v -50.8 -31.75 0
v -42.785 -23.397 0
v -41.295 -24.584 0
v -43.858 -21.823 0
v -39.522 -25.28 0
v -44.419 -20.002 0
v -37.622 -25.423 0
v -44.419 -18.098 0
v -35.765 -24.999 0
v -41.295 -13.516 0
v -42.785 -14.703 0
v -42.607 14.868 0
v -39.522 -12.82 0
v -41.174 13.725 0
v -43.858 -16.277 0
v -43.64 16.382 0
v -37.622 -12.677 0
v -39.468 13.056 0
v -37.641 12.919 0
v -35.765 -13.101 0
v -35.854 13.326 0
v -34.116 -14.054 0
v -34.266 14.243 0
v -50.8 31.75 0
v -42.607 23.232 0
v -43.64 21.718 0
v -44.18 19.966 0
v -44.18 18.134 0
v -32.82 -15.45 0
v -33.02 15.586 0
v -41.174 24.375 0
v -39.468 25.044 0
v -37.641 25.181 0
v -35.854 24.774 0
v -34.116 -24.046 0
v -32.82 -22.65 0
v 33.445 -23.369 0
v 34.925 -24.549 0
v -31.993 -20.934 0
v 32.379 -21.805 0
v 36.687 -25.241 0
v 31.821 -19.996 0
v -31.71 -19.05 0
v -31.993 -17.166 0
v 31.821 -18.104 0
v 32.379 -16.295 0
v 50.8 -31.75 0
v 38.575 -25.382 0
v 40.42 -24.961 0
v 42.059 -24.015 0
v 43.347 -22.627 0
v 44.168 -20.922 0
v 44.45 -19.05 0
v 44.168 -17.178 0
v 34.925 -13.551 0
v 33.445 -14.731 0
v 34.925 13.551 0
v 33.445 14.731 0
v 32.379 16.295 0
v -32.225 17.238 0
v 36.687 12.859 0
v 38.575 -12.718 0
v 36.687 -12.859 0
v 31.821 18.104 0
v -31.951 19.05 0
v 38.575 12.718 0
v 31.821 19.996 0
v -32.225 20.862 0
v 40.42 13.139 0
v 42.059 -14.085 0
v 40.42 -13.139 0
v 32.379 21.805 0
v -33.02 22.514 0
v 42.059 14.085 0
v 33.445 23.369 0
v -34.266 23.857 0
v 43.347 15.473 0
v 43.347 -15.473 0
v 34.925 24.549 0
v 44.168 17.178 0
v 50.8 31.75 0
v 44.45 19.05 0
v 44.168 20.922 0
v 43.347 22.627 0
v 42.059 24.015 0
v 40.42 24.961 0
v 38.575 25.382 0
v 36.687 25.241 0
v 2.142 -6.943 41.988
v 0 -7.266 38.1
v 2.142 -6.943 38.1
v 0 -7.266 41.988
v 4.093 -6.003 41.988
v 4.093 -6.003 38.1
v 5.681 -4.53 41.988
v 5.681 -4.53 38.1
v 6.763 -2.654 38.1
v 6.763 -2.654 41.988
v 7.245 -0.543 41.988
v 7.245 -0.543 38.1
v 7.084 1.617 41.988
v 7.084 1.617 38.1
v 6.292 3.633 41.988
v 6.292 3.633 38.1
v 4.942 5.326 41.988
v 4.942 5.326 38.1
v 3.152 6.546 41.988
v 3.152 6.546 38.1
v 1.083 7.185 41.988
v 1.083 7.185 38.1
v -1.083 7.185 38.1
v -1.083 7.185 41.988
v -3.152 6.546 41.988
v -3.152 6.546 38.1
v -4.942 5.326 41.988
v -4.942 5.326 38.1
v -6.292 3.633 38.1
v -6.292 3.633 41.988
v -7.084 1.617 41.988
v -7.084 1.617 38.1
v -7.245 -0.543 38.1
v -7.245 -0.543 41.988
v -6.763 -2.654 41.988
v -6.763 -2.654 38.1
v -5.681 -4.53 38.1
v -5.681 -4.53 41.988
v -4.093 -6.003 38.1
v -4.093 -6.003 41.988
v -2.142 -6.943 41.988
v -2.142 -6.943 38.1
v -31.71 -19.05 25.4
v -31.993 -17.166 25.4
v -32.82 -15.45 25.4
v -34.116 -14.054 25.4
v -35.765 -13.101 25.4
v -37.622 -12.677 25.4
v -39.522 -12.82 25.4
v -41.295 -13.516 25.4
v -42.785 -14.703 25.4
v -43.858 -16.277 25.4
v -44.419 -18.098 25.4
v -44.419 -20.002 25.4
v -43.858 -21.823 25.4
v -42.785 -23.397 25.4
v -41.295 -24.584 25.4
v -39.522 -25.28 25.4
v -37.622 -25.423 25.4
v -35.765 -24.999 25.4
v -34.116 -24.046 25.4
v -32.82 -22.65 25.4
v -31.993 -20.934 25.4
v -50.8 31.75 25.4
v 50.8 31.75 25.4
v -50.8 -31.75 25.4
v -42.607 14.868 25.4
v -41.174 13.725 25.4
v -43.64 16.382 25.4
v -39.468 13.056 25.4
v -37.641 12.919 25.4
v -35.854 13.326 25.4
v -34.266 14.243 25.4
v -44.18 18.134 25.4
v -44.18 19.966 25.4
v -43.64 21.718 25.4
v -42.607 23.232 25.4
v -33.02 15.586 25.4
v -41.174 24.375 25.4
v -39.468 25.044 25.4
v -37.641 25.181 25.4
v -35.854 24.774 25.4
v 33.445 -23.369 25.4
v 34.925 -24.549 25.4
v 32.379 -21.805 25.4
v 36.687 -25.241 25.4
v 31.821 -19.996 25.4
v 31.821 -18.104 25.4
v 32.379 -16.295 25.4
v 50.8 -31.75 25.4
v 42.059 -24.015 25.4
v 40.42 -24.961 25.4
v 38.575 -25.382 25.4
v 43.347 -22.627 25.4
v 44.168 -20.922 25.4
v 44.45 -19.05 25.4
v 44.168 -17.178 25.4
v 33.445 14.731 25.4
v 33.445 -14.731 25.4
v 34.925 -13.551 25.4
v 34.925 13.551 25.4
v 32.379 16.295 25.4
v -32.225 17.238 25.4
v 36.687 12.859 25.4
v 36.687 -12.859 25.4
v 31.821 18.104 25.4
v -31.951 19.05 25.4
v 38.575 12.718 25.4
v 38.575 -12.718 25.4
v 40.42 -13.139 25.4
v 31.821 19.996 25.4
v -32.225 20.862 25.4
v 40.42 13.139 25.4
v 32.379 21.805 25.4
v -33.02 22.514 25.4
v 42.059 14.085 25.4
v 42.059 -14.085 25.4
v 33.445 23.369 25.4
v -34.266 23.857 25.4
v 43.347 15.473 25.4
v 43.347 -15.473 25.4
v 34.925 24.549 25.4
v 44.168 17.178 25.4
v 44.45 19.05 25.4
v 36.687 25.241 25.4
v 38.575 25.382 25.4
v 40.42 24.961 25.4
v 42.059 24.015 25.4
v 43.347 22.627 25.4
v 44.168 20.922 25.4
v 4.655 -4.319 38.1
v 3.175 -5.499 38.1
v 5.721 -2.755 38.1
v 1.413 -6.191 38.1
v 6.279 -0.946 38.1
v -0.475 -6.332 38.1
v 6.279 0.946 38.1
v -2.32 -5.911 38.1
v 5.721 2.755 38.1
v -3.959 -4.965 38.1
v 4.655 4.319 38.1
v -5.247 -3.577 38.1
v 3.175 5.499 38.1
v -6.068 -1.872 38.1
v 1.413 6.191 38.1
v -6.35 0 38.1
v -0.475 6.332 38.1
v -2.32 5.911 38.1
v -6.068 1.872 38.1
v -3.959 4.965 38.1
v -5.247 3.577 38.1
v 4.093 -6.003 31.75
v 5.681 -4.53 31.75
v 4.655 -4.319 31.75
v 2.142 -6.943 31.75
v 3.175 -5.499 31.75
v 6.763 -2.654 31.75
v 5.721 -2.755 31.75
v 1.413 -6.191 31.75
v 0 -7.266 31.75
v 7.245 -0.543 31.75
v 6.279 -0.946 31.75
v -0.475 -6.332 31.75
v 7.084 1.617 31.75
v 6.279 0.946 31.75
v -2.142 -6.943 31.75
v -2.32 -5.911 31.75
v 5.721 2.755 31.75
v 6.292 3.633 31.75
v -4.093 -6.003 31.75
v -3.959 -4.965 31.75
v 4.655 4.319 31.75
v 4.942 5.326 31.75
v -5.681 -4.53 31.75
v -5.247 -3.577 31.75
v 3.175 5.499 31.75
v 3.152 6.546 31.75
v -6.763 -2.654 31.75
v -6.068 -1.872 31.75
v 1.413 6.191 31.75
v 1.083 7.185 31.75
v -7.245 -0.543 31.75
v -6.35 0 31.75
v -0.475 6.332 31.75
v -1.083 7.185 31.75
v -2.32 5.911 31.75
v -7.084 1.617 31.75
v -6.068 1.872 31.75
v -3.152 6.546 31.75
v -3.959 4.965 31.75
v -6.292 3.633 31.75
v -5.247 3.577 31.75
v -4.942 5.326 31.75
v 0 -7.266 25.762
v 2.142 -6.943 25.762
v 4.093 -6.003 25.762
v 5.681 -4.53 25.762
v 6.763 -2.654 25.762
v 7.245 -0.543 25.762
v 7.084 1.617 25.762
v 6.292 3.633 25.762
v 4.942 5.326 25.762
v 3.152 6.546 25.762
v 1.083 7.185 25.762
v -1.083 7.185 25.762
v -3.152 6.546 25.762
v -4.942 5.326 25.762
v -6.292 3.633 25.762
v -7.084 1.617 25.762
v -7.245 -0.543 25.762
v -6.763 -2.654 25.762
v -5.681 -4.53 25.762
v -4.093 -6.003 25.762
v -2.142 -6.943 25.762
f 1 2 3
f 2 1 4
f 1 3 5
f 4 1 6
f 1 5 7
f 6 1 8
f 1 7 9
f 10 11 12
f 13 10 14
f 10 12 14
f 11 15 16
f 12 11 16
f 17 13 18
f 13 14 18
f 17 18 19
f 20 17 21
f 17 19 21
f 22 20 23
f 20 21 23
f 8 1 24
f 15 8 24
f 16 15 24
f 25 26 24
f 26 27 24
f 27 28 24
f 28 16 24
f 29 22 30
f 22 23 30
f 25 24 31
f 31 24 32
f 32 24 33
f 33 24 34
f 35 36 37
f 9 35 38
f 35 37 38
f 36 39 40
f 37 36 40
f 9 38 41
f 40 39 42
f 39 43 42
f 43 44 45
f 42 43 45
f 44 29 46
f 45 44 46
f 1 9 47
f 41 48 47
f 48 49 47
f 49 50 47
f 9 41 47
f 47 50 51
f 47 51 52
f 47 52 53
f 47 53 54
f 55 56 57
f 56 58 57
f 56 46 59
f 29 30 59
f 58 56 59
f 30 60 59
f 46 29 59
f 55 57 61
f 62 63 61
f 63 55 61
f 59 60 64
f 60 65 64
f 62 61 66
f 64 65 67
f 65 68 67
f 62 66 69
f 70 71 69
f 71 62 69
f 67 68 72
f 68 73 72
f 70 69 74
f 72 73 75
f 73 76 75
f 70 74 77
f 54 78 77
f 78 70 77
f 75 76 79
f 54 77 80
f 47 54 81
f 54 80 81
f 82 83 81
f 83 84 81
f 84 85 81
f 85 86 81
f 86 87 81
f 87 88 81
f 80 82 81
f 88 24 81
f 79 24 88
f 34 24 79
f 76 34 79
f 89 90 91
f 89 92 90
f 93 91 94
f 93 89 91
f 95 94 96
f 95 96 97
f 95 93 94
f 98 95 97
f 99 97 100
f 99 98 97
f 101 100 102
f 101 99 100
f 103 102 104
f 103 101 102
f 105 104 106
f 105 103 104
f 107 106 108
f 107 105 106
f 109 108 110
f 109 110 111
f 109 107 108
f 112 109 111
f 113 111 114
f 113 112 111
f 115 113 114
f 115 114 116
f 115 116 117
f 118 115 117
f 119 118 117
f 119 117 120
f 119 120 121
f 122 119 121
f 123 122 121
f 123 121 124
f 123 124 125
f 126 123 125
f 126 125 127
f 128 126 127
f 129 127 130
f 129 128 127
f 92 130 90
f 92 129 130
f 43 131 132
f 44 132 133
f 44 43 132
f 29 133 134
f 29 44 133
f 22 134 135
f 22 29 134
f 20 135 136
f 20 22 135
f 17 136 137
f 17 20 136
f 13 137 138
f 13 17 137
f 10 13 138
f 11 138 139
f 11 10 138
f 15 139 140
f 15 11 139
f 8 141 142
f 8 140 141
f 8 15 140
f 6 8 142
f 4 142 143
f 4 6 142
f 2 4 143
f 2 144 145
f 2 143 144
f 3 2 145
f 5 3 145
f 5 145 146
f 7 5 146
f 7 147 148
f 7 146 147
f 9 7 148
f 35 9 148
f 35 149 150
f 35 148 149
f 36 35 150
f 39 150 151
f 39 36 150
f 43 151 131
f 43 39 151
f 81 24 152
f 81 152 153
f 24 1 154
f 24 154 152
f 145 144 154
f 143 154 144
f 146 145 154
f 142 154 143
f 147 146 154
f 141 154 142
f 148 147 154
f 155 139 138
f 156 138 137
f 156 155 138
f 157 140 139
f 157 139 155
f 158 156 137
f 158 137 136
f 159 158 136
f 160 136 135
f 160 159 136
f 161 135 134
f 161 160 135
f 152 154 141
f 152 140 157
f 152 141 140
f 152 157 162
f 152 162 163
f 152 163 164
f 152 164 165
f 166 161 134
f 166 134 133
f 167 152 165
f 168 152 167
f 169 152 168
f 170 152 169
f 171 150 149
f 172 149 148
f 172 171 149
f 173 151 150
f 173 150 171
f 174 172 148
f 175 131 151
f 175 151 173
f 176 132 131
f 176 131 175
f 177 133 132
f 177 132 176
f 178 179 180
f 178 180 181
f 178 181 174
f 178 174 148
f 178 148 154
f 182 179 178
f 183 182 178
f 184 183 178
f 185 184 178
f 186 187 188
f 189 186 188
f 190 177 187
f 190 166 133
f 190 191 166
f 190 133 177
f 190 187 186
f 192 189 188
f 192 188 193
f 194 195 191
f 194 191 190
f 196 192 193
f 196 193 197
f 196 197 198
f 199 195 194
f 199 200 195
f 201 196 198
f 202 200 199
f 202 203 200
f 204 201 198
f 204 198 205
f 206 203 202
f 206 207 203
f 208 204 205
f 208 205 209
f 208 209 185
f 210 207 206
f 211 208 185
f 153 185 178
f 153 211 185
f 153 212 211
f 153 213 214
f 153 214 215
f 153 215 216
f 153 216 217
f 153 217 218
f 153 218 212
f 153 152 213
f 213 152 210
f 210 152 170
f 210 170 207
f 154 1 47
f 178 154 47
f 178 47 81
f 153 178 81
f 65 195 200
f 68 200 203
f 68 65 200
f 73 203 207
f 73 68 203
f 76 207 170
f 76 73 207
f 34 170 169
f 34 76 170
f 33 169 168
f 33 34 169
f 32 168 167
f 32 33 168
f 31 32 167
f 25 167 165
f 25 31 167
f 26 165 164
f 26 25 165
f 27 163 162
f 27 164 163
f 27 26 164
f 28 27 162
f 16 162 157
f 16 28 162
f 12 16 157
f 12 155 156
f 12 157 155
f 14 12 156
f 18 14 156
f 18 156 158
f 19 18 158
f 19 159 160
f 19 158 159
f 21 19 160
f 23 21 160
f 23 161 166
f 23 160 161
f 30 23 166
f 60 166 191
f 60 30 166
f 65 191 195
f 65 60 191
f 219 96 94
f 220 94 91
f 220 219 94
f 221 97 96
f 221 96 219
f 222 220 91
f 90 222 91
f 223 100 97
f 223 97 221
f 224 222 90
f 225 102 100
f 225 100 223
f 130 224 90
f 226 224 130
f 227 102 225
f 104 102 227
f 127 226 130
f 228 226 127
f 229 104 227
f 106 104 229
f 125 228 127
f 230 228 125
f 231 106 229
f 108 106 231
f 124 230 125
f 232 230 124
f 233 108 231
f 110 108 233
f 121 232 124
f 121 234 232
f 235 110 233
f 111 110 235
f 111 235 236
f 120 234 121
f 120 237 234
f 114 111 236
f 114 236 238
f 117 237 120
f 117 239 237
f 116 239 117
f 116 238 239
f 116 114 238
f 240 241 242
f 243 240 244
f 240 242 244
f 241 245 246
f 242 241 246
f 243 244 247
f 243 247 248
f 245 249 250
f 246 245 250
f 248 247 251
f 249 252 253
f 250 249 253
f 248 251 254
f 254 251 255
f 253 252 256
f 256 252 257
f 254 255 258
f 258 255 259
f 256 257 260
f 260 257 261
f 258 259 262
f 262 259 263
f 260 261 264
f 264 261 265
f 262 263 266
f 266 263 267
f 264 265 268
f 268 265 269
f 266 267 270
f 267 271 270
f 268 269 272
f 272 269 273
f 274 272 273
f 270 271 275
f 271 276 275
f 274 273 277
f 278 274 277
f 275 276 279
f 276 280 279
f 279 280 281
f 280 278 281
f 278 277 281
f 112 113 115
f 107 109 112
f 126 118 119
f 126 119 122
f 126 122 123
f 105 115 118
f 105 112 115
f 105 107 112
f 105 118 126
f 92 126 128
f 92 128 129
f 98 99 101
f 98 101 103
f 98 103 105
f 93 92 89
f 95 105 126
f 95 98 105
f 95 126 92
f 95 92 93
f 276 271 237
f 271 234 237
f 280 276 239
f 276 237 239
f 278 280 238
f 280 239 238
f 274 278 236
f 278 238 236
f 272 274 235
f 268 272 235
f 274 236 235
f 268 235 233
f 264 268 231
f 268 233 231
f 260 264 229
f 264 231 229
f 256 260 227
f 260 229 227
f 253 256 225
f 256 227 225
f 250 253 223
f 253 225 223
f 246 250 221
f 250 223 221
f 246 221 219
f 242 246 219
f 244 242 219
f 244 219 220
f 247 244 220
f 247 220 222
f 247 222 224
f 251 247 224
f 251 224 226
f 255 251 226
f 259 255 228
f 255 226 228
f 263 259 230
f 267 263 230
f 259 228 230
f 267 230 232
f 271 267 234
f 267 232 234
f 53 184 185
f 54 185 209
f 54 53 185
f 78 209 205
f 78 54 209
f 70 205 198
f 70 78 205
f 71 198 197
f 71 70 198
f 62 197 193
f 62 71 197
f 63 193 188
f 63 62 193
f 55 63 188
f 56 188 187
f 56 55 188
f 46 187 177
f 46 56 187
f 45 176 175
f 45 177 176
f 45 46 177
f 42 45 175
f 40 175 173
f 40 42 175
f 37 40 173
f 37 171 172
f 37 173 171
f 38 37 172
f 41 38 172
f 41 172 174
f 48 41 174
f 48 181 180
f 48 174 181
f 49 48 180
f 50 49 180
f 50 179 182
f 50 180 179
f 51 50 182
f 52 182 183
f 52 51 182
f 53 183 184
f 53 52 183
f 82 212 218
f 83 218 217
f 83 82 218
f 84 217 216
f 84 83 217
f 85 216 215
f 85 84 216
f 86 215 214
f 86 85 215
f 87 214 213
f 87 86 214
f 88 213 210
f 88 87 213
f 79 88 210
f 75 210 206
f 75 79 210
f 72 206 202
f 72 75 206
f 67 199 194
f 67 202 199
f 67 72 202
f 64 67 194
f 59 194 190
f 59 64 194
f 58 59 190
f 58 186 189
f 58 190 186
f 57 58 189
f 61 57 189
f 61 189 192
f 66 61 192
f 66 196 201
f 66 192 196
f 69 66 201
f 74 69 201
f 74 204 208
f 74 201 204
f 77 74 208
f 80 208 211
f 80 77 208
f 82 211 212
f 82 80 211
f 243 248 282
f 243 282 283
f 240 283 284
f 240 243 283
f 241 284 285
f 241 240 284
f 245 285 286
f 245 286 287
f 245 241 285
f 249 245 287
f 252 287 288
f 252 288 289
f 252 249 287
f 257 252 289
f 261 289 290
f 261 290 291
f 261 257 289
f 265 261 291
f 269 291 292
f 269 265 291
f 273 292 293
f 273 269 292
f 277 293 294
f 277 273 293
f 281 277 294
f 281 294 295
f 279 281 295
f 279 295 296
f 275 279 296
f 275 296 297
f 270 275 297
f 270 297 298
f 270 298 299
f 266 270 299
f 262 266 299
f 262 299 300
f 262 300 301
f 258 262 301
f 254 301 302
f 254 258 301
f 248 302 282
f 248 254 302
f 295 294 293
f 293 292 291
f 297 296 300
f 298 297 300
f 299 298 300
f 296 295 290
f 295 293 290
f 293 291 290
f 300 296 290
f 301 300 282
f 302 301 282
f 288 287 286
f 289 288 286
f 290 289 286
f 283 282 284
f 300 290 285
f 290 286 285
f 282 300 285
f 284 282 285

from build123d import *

# Parameters (mm, degrees)
F0_W     = 101.6
F0_H     = 63.5
F1_DEPTH = 25.4
F2_R     = 6.35
F2_R_2   = 6.1485324999
F2_R_3   = 6.390422985
F3_DEPTH = 25.401
F4_W     = 7.2657507844
F4_H     = 16.2262842059
F6_W     = 4.8879137634
F6_H     = 6.35


with BuildPart() as f1:
    # F0 (on Top) → F1 (new body)
    with BuildSketch(Plane.XY):
        Rectangle(F0_W, F0_H)
    extrude(amount=F1_DEPTH)

    # F2 (on Top) → F3 (cut, through all)
    with BuildSketch(Plane.XY):
        with Locations((38.1, -19.05)):
            Circle(F2_R)
        with Locations((38.1, 19.05)):
            Circle(F2_R)
        with Locations((-38.1, 19.05)):
            Circle(F2_R_2)
        with Locations((-38.1, -19.05)):
            Circle(F2_R_3)
    extrude(amount=F3_DEPTH, mode=Mode.SUBTRACT)


with BuildPart() as f5:
    # F4 (on Right) → F5 (revolve)
    with BuildSketch(Plane.YZ):
        with Locations((-3.6328753922, 33.875156194)):
            Rectangle(F4_W, F4_H)
    revolve(axis=Axis((0, 0, 33.875156194), (0, 0, 1)))

    # F6 (on Front) → F7 (revolve, cut)
    with BuildSketch(Plane.XZ):
        with Locations((-8.7939568817, 34.925)):
            Rectangle(F6_W, F6_H)
    revolve(axis=Axis((0, 0, 41.9882982969), (0, 0, -1)), mode=Mode.SUBTRACT)


solid = Compound([f1.part, f5.part])
